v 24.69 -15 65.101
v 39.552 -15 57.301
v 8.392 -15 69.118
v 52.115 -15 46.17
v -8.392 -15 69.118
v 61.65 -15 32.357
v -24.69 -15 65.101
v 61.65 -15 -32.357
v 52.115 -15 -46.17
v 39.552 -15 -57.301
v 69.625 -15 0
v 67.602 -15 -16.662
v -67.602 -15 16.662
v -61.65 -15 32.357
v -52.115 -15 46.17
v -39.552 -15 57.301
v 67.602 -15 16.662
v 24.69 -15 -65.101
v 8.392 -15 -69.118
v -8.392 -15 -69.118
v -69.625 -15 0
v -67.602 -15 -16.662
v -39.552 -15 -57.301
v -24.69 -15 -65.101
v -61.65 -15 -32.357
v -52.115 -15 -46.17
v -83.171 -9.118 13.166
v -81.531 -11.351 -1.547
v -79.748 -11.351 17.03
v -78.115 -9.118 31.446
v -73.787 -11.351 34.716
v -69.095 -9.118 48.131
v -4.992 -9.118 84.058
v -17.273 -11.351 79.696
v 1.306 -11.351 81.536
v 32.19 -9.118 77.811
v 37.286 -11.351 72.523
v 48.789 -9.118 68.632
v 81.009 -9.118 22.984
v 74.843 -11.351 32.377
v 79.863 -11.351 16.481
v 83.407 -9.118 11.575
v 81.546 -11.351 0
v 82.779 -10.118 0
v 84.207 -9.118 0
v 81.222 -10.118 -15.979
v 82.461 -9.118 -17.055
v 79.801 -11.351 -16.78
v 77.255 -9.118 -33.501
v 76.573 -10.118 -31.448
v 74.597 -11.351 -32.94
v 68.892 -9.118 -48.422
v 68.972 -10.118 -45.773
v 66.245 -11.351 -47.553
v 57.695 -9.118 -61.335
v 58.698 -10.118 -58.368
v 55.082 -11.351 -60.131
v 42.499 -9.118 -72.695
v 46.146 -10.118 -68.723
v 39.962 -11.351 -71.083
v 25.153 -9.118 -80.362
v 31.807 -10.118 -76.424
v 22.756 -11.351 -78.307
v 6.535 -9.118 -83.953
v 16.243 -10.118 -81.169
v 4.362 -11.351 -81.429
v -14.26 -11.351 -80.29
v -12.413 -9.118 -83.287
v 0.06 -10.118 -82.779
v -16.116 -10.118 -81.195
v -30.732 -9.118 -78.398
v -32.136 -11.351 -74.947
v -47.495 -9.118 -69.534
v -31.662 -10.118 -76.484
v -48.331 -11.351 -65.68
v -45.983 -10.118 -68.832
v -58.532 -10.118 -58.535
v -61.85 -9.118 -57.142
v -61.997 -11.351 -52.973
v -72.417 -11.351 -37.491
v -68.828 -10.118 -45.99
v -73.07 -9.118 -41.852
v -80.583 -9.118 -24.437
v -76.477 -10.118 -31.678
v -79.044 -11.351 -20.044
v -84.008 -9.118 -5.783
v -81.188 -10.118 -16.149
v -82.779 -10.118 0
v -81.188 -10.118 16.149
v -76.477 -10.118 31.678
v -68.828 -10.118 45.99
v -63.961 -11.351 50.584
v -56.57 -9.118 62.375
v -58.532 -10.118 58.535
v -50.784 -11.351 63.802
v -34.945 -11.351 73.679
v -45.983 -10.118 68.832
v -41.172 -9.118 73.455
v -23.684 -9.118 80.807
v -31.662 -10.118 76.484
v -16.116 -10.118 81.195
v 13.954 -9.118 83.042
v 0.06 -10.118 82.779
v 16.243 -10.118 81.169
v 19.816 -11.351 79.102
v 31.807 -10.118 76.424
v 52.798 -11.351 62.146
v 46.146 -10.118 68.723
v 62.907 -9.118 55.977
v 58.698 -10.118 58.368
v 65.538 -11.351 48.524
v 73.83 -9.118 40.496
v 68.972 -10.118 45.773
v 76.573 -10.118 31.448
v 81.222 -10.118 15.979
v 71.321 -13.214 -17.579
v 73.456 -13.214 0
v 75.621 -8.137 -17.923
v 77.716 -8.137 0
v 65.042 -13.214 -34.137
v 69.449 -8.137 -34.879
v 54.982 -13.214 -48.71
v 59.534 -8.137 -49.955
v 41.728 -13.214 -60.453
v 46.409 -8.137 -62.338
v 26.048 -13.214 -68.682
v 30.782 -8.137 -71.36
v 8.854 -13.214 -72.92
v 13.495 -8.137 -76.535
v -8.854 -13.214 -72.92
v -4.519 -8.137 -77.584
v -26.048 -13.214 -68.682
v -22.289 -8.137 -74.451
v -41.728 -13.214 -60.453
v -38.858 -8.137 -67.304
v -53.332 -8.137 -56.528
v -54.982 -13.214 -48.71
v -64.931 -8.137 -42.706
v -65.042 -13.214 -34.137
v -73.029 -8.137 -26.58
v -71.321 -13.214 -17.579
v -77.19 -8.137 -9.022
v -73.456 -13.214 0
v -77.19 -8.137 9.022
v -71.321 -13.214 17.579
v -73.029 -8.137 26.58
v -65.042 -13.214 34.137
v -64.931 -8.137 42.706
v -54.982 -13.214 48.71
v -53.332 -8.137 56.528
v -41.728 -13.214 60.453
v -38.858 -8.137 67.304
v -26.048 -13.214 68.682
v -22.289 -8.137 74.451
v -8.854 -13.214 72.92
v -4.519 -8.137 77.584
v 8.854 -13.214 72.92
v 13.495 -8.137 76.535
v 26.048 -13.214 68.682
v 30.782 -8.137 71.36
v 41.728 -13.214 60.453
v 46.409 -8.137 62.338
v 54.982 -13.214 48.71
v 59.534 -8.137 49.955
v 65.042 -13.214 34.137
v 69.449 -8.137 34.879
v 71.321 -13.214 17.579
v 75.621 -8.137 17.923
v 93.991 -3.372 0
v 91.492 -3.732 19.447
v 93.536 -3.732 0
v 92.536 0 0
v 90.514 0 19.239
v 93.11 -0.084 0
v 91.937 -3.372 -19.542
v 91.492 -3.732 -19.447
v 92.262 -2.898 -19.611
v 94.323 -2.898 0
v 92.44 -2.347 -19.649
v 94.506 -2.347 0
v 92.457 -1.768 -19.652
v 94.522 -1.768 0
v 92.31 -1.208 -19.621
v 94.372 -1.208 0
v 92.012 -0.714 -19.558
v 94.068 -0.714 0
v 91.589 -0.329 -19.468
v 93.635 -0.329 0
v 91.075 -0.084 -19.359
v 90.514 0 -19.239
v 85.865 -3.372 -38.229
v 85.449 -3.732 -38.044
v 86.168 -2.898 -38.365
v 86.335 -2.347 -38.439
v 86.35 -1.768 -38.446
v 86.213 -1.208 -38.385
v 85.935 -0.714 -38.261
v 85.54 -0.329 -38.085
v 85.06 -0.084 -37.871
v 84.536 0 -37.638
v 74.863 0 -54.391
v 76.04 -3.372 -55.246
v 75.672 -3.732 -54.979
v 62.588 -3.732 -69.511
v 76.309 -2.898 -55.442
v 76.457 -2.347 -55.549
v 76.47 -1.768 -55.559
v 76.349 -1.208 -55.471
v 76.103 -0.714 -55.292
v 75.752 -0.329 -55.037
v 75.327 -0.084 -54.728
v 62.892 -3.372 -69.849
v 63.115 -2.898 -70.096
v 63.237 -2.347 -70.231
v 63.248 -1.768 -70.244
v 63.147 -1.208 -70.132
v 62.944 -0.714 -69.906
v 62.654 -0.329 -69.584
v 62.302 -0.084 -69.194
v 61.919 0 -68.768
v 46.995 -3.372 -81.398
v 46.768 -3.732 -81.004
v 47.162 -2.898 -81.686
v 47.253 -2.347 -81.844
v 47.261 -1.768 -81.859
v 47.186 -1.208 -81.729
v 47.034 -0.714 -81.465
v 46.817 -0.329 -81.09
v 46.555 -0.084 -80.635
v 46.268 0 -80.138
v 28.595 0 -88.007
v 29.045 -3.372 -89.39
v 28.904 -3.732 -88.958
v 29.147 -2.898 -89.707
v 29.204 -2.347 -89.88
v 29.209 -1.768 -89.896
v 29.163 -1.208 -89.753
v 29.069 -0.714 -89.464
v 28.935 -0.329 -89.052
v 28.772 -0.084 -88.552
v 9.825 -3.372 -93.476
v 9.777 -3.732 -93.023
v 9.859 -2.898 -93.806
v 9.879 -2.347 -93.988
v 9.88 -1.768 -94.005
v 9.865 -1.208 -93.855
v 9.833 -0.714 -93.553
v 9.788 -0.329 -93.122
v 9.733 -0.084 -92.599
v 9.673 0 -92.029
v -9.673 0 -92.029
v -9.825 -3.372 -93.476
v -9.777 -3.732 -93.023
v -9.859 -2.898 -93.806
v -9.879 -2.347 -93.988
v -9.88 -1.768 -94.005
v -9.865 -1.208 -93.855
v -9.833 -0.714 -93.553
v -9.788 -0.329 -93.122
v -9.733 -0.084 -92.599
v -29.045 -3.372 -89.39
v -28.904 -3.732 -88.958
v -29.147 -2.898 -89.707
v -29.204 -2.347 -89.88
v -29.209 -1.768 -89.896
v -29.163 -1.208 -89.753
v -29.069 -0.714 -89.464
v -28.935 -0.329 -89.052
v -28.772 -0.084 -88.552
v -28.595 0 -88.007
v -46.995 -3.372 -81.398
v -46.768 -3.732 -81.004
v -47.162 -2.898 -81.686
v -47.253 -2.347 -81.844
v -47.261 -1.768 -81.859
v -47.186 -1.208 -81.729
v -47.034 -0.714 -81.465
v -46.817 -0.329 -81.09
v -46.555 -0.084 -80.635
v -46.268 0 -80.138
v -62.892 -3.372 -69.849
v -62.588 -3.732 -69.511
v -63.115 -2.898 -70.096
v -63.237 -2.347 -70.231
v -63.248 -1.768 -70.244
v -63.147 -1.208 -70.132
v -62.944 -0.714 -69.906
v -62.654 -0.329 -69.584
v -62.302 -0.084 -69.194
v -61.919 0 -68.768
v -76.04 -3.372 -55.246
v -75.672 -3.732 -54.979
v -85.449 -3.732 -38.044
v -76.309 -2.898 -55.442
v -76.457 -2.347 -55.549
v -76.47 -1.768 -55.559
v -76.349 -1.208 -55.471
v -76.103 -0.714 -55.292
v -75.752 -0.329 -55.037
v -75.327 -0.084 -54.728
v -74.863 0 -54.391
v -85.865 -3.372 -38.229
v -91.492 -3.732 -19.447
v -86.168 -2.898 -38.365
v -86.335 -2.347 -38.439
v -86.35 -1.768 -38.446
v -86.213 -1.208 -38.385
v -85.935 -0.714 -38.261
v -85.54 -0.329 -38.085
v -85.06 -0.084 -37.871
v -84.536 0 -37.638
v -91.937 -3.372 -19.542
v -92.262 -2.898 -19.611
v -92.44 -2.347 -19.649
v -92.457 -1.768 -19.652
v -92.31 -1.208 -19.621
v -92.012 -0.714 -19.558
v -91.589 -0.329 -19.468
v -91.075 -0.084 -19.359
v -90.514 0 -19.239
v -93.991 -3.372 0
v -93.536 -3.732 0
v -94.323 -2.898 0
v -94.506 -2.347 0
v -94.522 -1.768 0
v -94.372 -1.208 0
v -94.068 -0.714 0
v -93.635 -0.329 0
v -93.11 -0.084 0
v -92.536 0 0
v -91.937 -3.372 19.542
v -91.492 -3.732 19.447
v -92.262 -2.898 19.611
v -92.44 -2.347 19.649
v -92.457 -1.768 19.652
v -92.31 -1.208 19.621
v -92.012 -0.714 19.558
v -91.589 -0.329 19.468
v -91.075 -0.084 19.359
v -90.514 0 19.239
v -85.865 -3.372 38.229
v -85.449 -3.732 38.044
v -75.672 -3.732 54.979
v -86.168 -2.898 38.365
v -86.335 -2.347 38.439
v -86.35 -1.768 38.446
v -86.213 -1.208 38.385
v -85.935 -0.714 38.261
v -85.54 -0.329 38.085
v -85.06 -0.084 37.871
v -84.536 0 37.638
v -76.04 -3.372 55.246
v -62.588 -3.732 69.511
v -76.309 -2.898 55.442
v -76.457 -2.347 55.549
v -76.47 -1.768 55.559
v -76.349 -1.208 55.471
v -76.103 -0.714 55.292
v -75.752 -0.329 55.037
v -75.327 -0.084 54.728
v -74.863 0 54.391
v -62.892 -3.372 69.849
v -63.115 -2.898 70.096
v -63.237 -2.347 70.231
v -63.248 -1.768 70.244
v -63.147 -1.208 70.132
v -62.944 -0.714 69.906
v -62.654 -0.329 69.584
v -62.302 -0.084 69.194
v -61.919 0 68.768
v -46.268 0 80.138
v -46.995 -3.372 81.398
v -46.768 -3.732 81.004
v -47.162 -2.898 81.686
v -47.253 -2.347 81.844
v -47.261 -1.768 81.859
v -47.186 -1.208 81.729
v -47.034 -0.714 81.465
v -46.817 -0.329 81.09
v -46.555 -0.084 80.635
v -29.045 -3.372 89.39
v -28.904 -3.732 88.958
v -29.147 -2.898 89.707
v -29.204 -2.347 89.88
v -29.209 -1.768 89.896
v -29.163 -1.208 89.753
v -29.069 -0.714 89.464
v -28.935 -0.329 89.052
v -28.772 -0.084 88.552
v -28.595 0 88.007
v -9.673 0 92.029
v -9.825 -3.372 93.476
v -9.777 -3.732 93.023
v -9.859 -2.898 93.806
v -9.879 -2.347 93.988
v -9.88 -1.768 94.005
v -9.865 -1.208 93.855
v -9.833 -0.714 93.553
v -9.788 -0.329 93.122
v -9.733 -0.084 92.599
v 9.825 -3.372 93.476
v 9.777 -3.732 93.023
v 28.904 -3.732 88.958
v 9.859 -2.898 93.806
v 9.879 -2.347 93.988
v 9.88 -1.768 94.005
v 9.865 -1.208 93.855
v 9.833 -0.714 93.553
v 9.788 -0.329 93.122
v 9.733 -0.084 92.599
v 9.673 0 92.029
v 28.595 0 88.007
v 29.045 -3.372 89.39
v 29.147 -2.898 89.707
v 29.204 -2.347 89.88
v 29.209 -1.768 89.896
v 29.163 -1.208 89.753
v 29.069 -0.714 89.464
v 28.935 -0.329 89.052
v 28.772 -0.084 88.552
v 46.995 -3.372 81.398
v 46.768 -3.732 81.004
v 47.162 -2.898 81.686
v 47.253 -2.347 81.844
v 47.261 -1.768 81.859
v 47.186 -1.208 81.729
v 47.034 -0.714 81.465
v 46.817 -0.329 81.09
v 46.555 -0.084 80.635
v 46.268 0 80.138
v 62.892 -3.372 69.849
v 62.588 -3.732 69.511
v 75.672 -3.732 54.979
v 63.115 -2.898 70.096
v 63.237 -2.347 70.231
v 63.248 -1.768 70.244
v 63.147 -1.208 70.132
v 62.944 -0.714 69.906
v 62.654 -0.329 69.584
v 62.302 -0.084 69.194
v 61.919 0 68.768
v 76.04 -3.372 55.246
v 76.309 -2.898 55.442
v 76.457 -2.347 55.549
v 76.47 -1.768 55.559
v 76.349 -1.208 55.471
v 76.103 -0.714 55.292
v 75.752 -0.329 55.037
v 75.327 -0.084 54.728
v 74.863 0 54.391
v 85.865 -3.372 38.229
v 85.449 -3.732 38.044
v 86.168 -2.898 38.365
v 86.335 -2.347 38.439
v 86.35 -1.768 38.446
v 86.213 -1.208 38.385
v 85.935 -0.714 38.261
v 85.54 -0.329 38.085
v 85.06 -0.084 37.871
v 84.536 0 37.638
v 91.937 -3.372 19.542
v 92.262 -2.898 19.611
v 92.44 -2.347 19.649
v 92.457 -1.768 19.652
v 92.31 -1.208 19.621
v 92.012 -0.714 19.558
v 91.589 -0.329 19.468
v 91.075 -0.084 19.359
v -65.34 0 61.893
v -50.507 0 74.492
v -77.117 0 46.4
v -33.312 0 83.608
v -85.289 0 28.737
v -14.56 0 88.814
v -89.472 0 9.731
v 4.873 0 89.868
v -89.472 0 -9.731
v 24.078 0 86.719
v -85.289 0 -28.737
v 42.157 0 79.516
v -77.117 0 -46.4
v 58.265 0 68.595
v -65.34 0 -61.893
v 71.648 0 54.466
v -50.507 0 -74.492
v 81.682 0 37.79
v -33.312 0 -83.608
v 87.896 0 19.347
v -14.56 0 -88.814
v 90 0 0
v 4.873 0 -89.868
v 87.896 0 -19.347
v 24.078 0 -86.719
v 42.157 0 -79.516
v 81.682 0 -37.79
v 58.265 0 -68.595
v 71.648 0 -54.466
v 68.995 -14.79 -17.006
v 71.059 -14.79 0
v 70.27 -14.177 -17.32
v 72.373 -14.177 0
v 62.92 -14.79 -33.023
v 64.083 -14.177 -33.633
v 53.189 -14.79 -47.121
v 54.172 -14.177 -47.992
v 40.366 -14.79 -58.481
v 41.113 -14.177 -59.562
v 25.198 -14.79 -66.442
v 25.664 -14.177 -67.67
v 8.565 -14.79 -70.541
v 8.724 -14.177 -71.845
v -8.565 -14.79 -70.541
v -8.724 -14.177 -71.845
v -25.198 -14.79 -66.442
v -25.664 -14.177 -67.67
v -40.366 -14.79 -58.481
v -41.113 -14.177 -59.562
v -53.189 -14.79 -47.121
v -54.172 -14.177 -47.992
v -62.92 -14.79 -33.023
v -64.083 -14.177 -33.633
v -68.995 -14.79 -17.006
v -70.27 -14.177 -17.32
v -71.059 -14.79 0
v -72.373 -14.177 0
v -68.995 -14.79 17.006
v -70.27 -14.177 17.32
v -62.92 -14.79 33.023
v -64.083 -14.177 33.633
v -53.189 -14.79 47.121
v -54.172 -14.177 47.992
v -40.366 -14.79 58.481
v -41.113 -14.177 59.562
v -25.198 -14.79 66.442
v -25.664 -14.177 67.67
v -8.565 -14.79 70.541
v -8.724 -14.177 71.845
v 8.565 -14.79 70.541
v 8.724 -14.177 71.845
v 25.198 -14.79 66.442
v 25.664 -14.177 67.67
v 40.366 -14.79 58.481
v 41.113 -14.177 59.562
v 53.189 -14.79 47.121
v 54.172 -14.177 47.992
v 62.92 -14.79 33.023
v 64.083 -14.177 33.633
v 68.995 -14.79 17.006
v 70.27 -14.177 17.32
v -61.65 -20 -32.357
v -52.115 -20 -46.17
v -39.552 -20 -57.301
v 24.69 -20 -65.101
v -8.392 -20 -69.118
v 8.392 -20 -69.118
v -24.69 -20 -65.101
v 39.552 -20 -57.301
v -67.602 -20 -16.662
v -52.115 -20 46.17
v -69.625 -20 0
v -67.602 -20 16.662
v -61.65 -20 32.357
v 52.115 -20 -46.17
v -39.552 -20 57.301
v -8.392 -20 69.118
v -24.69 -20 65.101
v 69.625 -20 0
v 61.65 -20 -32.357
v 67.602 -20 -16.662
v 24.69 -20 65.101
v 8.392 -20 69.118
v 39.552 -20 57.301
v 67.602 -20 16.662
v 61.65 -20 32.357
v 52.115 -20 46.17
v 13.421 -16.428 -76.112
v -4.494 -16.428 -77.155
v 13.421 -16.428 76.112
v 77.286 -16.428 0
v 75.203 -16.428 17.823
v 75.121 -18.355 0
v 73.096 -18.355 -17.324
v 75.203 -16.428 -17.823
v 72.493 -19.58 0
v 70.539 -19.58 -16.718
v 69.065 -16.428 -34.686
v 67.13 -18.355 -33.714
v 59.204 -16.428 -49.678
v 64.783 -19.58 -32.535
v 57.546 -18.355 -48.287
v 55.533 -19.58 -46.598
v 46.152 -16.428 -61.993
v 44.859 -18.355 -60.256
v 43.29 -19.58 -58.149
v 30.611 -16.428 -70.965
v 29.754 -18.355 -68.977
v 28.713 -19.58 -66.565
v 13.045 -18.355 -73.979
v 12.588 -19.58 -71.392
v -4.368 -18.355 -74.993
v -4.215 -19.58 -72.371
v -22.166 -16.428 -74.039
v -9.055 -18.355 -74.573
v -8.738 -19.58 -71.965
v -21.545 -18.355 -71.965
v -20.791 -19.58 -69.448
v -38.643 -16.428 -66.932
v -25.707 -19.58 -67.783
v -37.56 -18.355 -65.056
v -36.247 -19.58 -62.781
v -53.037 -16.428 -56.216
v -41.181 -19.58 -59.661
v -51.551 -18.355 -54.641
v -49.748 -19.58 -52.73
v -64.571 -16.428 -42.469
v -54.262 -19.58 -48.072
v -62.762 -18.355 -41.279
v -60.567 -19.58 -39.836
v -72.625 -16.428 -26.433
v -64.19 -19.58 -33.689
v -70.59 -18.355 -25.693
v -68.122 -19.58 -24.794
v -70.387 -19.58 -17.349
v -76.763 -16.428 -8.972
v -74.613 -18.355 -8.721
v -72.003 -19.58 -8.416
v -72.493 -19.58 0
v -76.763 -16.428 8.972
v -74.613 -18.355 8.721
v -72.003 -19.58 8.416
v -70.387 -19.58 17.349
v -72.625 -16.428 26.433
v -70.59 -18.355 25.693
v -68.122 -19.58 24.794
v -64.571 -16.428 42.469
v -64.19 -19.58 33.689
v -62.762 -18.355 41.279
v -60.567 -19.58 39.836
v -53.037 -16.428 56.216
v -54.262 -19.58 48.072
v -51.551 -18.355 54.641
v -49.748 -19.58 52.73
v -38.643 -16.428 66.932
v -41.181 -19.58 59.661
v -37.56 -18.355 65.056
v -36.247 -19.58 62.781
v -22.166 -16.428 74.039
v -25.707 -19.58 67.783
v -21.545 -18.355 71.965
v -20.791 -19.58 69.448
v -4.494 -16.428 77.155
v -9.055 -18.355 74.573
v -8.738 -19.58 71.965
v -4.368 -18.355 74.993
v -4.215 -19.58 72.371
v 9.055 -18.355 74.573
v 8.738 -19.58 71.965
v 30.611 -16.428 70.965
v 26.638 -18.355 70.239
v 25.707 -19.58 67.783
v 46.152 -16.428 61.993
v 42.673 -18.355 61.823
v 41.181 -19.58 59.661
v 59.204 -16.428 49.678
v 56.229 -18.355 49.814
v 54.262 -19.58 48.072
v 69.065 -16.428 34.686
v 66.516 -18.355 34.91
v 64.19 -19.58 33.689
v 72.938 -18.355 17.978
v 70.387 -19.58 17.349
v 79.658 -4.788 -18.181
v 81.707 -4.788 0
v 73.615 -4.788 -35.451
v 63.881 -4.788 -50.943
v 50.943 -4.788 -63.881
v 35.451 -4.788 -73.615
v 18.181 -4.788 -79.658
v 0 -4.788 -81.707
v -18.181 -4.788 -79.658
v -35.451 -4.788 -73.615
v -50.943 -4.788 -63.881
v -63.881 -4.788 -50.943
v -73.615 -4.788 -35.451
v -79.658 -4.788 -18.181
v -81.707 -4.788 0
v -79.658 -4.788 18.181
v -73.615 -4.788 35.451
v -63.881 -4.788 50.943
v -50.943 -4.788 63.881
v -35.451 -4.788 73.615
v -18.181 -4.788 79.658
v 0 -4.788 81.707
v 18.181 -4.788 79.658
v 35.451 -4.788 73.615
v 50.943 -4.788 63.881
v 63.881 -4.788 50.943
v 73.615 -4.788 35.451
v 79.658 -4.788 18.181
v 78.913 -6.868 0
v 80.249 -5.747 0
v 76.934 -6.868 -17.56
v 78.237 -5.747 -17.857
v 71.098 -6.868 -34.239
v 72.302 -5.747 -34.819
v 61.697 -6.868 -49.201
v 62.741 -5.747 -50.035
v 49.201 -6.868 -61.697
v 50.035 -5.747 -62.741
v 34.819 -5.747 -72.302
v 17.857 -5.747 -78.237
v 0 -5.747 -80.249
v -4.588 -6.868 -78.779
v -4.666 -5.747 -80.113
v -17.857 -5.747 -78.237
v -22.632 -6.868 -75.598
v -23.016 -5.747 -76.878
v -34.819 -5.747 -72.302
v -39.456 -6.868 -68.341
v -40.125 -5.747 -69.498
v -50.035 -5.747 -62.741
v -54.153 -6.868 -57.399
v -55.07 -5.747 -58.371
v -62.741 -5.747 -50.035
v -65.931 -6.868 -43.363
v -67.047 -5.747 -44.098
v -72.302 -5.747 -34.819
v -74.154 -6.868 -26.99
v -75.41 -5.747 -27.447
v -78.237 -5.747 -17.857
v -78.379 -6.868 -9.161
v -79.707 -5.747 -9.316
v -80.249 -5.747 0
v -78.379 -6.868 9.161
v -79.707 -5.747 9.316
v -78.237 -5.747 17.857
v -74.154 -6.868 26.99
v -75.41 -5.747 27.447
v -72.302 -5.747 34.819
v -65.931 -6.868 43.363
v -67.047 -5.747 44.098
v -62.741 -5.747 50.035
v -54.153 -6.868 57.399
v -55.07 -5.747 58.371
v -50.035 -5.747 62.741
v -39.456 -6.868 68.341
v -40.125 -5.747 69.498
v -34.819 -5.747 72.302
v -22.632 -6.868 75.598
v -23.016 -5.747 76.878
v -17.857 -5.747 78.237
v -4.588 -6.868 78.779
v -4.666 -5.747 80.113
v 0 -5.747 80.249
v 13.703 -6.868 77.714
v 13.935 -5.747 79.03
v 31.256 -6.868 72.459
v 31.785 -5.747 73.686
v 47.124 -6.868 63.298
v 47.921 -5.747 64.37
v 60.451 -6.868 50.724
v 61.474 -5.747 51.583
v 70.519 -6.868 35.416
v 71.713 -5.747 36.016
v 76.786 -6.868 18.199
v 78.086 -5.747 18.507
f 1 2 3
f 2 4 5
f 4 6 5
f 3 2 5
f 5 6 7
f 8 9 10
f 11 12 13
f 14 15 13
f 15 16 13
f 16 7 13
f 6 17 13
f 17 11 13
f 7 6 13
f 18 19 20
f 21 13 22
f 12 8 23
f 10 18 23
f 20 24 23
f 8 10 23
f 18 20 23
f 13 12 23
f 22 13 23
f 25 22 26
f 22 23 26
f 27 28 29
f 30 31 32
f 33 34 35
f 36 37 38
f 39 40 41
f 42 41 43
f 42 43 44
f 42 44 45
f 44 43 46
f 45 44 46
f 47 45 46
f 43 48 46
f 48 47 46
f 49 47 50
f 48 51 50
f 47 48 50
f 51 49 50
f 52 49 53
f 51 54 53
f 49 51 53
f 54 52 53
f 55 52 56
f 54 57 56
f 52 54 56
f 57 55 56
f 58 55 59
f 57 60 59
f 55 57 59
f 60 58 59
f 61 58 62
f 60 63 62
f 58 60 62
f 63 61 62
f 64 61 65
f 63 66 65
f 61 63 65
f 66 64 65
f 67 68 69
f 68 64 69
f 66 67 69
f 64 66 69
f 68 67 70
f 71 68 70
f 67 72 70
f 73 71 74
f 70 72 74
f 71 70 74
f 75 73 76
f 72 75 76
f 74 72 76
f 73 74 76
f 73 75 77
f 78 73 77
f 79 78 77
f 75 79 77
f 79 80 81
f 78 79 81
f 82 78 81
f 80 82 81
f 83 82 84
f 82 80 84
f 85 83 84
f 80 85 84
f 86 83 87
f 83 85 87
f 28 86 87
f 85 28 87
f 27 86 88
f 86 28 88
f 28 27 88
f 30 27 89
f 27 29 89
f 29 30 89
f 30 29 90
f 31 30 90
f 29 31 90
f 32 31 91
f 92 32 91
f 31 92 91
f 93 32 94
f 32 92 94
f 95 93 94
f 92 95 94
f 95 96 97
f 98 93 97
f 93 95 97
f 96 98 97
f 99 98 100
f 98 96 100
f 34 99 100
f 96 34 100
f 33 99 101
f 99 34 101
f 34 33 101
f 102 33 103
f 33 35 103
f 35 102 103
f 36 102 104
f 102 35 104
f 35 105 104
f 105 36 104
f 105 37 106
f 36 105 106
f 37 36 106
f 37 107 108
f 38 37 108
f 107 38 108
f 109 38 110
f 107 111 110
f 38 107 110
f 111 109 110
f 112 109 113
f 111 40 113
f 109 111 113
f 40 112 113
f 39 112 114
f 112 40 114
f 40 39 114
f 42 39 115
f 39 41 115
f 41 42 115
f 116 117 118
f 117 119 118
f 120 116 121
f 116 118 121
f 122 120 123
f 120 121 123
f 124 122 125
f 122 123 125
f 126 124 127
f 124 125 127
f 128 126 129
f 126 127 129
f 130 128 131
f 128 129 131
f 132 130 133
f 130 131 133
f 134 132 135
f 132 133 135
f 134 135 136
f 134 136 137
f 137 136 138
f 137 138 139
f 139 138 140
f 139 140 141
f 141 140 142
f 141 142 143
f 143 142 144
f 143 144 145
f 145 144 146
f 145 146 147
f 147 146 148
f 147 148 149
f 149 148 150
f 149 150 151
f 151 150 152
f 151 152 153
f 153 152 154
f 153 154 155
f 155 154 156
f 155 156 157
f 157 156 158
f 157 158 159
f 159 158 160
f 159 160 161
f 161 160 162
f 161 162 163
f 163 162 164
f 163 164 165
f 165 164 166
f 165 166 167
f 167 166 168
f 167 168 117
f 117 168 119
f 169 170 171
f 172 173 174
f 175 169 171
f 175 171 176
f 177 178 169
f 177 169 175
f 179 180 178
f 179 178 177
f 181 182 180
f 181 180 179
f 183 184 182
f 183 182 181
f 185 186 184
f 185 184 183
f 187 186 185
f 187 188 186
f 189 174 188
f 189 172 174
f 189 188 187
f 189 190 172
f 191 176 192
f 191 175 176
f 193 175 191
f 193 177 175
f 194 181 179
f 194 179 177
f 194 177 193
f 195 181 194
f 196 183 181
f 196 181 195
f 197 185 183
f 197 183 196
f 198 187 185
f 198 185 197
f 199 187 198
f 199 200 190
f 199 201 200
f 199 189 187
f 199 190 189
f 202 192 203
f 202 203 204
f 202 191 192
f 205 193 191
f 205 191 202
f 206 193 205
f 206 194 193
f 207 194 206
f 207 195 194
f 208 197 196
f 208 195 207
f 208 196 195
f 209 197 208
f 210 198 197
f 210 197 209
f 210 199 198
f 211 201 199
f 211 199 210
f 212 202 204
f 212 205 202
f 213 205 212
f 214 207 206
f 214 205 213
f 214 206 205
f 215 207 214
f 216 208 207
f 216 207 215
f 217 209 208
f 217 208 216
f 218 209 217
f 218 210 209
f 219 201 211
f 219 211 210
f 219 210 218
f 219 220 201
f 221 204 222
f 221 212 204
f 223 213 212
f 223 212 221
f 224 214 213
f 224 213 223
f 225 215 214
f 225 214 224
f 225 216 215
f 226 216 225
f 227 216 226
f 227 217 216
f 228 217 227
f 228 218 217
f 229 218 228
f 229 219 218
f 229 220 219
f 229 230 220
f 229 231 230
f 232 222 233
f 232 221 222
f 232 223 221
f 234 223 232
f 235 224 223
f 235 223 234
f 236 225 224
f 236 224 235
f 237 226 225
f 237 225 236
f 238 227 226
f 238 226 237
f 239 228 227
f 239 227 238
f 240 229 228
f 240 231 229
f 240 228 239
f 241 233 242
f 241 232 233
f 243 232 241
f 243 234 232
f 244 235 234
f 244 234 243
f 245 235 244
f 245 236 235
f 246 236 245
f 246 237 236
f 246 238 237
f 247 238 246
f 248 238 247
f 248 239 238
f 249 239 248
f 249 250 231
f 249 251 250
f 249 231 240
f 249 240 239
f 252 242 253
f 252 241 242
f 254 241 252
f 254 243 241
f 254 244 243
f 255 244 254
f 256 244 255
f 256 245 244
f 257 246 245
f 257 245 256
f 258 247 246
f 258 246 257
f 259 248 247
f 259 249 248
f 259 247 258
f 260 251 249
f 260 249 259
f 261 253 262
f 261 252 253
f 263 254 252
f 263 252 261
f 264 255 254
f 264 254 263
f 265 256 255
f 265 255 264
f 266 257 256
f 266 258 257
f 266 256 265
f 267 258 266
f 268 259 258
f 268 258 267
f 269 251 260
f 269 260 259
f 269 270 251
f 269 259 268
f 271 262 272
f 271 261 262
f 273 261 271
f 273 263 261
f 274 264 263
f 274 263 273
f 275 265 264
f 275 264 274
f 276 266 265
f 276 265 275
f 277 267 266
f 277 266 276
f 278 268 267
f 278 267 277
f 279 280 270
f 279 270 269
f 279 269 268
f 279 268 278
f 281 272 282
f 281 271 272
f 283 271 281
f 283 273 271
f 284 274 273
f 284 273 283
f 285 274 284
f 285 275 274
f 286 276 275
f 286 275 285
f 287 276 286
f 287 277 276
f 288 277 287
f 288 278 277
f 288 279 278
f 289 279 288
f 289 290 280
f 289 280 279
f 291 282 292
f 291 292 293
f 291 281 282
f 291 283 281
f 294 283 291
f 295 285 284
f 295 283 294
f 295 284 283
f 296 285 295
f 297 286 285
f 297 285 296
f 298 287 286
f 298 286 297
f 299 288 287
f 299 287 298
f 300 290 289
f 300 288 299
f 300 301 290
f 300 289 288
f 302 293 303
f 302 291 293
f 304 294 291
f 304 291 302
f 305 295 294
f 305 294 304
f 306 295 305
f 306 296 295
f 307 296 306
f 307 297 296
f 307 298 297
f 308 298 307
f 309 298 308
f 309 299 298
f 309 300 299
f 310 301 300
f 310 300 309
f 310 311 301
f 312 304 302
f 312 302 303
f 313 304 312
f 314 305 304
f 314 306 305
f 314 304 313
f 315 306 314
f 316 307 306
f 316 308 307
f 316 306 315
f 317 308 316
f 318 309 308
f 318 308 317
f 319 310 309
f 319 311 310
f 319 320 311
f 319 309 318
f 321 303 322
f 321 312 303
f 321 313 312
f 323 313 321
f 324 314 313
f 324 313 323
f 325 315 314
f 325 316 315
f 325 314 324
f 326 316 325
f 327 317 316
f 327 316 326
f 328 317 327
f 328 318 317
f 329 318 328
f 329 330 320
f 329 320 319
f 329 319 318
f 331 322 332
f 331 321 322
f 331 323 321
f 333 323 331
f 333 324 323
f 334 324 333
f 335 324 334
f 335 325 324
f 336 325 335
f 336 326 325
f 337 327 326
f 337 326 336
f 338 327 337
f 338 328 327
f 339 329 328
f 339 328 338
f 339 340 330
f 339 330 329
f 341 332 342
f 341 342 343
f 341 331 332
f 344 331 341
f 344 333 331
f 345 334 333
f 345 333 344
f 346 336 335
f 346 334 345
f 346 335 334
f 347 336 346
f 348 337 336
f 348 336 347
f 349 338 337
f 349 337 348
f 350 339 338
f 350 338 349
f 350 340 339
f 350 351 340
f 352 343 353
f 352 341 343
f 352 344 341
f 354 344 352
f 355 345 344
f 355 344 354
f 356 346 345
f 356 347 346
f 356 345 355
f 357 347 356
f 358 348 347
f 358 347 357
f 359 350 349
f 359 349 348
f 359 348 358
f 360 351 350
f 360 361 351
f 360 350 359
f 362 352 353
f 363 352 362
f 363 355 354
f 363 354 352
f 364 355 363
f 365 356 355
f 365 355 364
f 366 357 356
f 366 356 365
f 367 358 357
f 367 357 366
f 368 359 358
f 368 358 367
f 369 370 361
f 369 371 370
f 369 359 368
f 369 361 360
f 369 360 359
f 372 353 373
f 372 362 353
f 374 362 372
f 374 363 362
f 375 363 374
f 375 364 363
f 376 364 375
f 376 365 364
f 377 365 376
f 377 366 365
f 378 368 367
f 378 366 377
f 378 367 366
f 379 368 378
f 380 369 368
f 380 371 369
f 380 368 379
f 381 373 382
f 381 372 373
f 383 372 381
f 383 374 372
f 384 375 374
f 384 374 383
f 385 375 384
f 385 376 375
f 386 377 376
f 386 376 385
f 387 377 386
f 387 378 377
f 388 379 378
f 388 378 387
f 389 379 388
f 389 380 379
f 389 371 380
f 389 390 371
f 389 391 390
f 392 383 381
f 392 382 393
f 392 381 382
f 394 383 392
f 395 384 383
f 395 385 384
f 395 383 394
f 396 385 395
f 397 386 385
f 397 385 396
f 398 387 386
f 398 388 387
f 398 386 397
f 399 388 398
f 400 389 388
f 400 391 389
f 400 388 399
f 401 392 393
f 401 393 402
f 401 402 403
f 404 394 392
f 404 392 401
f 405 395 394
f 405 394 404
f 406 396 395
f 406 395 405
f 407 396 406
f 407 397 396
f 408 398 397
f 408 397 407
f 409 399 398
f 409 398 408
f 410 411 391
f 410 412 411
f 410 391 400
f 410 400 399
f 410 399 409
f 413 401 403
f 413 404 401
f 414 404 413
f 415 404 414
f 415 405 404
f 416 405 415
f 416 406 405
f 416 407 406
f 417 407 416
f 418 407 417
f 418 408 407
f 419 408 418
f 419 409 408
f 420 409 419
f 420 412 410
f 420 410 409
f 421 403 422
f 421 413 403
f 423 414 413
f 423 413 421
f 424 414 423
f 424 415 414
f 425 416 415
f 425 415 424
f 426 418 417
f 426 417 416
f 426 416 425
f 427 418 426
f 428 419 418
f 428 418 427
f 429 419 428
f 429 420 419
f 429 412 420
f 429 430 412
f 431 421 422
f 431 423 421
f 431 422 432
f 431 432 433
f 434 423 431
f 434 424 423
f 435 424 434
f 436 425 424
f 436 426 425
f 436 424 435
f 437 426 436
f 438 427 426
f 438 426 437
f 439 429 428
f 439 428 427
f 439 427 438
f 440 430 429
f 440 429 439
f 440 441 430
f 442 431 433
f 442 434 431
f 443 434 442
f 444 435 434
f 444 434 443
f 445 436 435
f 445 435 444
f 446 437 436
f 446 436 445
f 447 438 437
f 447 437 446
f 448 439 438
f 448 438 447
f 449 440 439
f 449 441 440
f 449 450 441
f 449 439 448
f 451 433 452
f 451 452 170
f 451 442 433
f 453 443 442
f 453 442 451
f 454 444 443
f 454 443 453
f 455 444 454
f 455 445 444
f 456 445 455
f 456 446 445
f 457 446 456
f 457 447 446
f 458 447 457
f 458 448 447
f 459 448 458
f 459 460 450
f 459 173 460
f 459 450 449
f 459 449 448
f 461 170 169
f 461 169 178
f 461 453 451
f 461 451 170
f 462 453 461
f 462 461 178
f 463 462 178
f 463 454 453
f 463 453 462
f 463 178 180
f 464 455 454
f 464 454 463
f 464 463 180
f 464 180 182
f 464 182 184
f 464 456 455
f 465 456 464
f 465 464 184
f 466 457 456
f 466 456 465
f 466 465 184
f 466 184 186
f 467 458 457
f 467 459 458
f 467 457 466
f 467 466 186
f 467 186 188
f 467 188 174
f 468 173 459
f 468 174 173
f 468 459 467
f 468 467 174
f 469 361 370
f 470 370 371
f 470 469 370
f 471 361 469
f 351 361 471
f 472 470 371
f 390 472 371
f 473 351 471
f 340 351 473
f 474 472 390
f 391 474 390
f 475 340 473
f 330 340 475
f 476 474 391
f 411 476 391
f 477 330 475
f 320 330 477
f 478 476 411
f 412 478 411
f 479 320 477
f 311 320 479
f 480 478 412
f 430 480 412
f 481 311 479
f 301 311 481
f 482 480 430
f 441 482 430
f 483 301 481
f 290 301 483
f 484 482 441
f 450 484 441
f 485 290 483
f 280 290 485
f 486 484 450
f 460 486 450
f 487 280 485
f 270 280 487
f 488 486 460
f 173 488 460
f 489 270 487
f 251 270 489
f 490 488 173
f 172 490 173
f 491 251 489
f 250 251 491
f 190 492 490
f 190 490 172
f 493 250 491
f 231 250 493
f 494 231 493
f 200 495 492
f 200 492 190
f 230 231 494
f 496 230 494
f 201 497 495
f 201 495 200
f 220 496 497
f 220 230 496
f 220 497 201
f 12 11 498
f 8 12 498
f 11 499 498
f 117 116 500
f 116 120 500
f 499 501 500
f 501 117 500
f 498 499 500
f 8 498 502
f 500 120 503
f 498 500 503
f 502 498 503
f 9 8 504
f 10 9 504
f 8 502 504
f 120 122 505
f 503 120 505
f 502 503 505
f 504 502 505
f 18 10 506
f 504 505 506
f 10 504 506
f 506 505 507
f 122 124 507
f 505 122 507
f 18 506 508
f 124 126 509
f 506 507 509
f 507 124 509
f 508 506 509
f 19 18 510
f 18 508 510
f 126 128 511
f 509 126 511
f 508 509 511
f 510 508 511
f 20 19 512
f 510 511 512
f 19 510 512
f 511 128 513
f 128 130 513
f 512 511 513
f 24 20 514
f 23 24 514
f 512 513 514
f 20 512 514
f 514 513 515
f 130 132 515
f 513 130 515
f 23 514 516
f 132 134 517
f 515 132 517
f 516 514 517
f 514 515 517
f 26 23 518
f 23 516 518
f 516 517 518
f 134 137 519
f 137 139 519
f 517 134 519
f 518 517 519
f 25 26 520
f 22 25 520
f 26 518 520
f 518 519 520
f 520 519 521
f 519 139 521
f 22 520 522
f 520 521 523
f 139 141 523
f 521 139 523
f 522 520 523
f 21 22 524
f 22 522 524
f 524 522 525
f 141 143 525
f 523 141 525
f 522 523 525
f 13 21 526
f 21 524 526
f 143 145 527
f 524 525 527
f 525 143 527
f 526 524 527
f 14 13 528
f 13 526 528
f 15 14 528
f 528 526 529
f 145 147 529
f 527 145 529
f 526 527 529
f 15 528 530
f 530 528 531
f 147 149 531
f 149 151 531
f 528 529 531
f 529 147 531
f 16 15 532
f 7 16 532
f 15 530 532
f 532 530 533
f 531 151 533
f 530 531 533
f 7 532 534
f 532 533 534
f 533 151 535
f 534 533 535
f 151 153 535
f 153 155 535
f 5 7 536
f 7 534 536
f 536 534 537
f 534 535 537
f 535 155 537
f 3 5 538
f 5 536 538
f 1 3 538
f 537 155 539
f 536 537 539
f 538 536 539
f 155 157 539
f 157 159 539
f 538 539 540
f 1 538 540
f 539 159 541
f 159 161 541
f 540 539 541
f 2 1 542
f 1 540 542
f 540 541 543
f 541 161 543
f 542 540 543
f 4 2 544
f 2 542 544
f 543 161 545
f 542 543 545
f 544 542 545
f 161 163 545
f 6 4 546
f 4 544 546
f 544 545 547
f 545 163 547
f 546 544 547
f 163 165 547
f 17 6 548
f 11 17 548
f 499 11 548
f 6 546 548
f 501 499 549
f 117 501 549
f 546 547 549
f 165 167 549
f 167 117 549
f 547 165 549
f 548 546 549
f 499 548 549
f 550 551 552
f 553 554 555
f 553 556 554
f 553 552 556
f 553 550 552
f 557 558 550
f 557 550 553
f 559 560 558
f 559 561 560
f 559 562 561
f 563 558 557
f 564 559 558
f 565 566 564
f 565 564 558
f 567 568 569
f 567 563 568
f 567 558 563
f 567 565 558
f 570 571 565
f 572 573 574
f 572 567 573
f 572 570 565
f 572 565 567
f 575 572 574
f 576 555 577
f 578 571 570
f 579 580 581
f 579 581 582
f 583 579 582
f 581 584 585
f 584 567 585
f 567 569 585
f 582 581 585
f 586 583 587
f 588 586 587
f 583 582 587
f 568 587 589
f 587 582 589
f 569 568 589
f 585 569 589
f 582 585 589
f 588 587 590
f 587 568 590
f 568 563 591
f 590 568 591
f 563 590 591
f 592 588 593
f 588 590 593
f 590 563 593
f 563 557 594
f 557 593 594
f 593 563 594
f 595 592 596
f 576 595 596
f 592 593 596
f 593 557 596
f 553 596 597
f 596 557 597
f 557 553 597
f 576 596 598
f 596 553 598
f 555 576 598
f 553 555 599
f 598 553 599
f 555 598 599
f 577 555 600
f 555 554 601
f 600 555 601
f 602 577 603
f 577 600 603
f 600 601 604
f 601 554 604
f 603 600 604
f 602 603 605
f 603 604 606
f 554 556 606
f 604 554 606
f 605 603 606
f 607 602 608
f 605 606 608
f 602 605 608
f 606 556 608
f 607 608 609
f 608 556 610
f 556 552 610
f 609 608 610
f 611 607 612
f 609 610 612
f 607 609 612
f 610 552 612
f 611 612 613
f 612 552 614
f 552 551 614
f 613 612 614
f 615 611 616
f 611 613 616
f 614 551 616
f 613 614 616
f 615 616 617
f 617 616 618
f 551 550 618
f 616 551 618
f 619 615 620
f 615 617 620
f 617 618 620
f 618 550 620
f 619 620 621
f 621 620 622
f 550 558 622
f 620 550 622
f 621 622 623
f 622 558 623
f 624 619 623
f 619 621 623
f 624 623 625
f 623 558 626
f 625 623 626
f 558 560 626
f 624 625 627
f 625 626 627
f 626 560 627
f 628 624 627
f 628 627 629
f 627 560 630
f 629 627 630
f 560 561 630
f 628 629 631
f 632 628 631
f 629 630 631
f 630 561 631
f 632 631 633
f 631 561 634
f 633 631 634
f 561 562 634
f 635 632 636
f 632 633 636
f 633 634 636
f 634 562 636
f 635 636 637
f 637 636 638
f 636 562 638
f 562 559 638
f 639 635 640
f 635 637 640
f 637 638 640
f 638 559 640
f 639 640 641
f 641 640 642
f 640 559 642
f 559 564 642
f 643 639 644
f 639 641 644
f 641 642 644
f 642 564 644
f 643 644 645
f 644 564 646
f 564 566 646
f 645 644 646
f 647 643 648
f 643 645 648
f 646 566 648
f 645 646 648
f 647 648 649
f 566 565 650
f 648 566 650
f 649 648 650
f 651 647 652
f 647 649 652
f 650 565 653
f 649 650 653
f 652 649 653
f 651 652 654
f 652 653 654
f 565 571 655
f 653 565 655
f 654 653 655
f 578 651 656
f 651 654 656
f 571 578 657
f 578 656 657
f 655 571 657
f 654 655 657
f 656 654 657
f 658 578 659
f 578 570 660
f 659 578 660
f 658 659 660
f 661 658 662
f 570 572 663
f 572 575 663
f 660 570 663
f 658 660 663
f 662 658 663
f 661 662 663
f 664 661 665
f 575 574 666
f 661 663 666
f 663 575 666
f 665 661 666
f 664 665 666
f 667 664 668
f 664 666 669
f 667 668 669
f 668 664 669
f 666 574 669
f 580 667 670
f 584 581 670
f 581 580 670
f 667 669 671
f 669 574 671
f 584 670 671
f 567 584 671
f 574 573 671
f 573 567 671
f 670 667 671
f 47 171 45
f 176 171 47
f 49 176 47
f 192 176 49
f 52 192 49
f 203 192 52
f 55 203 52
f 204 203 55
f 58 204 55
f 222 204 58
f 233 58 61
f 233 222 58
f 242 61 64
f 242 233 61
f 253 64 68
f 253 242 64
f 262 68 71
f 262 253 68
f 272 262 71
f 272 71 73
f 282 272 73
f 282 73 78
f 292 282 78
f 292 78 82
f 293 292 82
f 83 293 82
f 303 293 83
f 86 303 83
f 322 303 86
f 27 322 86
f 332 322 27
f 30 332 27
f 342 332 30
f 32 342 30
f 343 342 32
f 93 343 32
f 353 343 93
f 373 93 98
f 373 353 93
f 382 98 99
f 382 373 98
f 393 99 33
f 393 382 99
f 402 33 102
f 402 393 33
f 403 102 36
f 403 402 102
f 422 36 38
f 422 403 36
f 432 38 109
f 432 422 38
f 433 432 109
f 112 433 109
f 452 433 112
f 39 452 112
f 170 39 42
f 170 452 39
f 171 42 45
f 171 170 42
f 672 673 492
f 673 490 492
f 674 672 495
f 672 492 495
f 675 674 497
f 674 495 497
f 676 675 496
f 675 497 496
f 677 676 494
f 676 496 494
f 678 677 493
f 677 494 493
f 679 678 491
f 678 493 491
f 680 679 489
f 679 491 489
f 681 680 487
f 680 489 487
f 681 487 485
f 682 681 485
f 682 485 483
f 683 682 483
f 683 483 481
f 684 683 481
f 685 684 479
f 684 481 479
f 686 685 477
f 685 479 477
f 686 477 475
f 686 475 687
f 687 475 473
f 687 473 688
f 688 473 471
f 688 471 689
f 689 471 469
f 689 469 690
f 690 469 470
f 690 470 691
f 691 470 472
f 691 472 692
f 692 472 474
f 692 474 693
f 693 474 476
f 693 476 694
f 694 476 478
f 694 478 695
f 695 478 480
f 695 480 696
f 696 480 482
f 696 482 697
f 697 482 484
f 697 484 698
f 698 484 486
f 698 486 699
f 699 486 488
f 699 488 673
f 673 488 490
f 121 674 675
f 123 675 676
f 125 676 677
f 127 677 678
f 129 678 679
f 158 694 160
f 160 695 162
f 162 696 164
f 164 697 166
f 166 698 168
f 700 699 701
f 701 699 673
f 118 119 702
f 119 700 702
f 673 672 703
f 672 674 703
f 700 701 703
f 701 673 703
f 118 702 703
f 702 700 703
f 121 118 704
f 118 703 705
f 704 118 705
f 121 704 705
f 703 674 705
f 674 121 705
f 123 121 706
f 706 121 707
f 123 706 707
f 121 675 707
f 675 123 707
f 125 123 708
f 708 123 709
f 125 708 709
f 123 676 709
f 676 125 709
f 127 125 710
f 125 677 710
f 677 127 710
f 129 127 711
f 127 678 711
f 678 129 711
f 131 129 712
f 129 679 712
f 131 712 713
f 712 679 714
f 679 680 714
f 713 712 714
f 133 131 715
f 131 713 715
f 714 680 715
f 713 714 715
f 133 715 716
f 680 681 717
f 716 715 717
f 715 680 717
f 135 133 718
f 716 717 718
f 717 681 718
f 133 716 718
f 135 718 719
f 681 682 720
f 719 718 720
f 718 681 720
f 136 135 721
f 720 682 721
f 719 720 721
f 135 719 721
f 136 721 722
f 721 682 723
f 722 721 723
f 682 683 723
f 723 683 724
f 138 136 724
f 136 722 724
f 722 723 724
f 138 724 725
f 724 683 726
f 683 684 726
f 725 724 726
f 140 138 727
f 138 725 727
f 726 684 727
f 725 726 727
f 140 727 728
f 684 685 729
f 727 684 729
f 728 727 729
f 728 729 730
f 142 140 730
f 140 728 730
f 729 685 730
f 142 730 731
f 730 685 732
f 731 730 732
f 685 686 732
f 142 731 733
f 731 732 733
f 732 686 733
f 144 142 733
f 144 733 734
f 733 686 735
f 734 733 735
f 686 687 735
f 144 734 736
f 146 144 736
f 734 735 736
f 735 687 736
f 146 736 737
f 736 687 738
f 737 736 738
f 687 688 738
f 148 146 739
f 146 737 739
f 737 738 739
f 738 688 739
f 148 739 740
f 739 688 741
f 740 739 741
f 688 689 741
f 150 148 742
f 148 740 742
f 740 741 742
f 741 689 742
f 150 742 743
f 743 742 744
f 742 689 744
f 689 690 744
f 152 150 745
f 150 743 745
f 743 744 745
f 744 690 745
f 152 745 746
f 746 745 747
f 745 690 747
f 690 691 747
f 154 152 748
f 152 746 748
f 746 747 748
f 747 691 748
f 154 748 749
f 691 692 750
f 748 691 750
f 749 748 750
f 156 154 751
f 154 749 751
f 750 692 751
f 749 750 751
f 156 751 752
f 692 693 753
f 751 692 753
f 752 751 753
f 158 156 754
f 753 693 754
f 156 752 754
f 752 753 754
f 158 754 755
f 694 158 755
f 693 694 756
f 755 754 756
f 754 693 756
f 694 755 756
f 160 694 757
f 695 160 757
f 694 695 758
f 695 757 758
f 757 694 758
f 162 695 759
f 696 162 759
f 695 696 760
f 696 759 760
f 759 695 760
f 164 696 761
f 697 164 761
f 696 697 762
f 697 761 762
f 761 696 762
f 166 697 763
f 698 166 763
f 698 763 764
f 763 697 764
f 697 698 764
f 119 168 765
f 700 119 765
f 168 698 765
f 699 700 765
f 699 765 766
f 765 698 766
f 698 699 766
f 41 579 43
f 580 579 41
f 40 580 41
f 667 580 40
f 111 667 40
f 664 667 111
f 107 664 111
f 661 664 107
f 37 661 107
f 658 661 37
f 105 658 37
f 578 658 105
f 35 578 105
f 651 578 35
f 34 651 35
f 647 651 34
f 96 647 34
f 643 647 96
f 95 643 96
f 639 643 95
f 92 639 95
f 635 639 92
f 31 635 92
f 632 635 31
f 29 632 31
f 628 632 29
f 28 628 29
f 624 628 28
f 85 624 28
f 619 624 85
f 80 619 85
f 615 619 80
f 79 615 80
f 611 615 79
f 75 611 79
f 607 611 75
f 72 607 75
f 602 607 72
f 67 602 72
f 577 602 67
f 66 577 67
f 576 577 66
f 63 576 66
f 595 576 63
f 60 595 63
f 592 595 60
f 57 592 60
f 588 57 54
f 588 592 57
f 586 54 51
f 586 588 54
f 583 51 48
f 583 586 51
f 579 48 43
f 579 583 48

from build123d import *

# Parameters (mm, degrees)
SKETCH1_R           = 100
BOSS_EXTRUDE1_DEPTH = 10
BOSS_EXTRUDE1_DRAFT = -60
SKETCH2_R           = 82.679491924
BOSS_EXTRUDE2_DEPTH = 10
BOSS_EXTRUDE2_TAPER = 40
FILLET1_R           = 10
FILLET2_R           = 2


# Read off the part's stored shape, not the designer's step: Shell2
with BuildPart() as part:
    # Sketch1 → Boss-Extrude1 (with draft: the straight prism first)
    with BuildSketch(Plane(origin=(0, 0, 0), x_dir=(1, 0, 0), z_dir=(0, 1, 0))):
        Circle(SKETCH1_R)
    extrude(amount=-BOSS_EXTRUDE1_DEPTH)
    # Boss-Extrude1: the draft: its side faces are tilted about the plane it starts from
    boss_extrude1_sides = [part.faces().sort_by_distance(p)[0] for p in [
        (-100, -5, 0),
    ]]
    draft(boss_extrude1_sides, Plane(origin=(0, 0, 0), x_dir=(1, 0, 0), z_dir=(0, 1, 0)), BOSS_EXTRUDE1_DRAFT)

    # Sketch2 → Boss-Extrude2 (add)
    with BuildSketch(Plane.XZ.offset(10)):
        Circle(SKETCH2_R)
    extrude(amount=BOSS_EXTRUDE2_DEPTH, taper=BOSS_EXTRUDE2_TAPER)

    # Fillet1
    fillet1_edges = [part.edges().sort_by_distance(p)[0] for p in [
        (-82.679491924, -10, 0),
        (-74.288495613, -20, 0),
    ]]
    fillet(fillet1_edges, radius=FILLET1_R)

    # Fillet2
    fillet2_edges = [part.edges().sort_by_distance(p)[0] for p in [
        (-100, 0, 0),
    ]]
    fillet(fillet2_edges, radius=FILLET2_R)

    # Shell2 outline → Shell2 (revolve, cut)
    with BuildSketch(Plane.XY):
        with BuildLine():
            ThreePointArc((77.715861724, -8.136804989), (79.564714226, -6.287952488), (81.706528371, -4.788238078))
            Line((81.706528371, -4.788238078), (90, 0))
            Line((90, 0), (0, 0))
            Line((0, 0), (0, -15))
            Line((0, -15), (69.625419031, -15))
            ThreePointArc((69.625419031, -15), (71.73851034, -14.531538935), (73.455641247, -13.213938048))
            Line((73.455641247, -13.213938048), (77.715861724, -8.136804989))
        make_face()
    revolve(axis=Axis((0, 0, 0), (0, 1, 0)), mode=Mode.SUBTRACT)


solid = part.part
